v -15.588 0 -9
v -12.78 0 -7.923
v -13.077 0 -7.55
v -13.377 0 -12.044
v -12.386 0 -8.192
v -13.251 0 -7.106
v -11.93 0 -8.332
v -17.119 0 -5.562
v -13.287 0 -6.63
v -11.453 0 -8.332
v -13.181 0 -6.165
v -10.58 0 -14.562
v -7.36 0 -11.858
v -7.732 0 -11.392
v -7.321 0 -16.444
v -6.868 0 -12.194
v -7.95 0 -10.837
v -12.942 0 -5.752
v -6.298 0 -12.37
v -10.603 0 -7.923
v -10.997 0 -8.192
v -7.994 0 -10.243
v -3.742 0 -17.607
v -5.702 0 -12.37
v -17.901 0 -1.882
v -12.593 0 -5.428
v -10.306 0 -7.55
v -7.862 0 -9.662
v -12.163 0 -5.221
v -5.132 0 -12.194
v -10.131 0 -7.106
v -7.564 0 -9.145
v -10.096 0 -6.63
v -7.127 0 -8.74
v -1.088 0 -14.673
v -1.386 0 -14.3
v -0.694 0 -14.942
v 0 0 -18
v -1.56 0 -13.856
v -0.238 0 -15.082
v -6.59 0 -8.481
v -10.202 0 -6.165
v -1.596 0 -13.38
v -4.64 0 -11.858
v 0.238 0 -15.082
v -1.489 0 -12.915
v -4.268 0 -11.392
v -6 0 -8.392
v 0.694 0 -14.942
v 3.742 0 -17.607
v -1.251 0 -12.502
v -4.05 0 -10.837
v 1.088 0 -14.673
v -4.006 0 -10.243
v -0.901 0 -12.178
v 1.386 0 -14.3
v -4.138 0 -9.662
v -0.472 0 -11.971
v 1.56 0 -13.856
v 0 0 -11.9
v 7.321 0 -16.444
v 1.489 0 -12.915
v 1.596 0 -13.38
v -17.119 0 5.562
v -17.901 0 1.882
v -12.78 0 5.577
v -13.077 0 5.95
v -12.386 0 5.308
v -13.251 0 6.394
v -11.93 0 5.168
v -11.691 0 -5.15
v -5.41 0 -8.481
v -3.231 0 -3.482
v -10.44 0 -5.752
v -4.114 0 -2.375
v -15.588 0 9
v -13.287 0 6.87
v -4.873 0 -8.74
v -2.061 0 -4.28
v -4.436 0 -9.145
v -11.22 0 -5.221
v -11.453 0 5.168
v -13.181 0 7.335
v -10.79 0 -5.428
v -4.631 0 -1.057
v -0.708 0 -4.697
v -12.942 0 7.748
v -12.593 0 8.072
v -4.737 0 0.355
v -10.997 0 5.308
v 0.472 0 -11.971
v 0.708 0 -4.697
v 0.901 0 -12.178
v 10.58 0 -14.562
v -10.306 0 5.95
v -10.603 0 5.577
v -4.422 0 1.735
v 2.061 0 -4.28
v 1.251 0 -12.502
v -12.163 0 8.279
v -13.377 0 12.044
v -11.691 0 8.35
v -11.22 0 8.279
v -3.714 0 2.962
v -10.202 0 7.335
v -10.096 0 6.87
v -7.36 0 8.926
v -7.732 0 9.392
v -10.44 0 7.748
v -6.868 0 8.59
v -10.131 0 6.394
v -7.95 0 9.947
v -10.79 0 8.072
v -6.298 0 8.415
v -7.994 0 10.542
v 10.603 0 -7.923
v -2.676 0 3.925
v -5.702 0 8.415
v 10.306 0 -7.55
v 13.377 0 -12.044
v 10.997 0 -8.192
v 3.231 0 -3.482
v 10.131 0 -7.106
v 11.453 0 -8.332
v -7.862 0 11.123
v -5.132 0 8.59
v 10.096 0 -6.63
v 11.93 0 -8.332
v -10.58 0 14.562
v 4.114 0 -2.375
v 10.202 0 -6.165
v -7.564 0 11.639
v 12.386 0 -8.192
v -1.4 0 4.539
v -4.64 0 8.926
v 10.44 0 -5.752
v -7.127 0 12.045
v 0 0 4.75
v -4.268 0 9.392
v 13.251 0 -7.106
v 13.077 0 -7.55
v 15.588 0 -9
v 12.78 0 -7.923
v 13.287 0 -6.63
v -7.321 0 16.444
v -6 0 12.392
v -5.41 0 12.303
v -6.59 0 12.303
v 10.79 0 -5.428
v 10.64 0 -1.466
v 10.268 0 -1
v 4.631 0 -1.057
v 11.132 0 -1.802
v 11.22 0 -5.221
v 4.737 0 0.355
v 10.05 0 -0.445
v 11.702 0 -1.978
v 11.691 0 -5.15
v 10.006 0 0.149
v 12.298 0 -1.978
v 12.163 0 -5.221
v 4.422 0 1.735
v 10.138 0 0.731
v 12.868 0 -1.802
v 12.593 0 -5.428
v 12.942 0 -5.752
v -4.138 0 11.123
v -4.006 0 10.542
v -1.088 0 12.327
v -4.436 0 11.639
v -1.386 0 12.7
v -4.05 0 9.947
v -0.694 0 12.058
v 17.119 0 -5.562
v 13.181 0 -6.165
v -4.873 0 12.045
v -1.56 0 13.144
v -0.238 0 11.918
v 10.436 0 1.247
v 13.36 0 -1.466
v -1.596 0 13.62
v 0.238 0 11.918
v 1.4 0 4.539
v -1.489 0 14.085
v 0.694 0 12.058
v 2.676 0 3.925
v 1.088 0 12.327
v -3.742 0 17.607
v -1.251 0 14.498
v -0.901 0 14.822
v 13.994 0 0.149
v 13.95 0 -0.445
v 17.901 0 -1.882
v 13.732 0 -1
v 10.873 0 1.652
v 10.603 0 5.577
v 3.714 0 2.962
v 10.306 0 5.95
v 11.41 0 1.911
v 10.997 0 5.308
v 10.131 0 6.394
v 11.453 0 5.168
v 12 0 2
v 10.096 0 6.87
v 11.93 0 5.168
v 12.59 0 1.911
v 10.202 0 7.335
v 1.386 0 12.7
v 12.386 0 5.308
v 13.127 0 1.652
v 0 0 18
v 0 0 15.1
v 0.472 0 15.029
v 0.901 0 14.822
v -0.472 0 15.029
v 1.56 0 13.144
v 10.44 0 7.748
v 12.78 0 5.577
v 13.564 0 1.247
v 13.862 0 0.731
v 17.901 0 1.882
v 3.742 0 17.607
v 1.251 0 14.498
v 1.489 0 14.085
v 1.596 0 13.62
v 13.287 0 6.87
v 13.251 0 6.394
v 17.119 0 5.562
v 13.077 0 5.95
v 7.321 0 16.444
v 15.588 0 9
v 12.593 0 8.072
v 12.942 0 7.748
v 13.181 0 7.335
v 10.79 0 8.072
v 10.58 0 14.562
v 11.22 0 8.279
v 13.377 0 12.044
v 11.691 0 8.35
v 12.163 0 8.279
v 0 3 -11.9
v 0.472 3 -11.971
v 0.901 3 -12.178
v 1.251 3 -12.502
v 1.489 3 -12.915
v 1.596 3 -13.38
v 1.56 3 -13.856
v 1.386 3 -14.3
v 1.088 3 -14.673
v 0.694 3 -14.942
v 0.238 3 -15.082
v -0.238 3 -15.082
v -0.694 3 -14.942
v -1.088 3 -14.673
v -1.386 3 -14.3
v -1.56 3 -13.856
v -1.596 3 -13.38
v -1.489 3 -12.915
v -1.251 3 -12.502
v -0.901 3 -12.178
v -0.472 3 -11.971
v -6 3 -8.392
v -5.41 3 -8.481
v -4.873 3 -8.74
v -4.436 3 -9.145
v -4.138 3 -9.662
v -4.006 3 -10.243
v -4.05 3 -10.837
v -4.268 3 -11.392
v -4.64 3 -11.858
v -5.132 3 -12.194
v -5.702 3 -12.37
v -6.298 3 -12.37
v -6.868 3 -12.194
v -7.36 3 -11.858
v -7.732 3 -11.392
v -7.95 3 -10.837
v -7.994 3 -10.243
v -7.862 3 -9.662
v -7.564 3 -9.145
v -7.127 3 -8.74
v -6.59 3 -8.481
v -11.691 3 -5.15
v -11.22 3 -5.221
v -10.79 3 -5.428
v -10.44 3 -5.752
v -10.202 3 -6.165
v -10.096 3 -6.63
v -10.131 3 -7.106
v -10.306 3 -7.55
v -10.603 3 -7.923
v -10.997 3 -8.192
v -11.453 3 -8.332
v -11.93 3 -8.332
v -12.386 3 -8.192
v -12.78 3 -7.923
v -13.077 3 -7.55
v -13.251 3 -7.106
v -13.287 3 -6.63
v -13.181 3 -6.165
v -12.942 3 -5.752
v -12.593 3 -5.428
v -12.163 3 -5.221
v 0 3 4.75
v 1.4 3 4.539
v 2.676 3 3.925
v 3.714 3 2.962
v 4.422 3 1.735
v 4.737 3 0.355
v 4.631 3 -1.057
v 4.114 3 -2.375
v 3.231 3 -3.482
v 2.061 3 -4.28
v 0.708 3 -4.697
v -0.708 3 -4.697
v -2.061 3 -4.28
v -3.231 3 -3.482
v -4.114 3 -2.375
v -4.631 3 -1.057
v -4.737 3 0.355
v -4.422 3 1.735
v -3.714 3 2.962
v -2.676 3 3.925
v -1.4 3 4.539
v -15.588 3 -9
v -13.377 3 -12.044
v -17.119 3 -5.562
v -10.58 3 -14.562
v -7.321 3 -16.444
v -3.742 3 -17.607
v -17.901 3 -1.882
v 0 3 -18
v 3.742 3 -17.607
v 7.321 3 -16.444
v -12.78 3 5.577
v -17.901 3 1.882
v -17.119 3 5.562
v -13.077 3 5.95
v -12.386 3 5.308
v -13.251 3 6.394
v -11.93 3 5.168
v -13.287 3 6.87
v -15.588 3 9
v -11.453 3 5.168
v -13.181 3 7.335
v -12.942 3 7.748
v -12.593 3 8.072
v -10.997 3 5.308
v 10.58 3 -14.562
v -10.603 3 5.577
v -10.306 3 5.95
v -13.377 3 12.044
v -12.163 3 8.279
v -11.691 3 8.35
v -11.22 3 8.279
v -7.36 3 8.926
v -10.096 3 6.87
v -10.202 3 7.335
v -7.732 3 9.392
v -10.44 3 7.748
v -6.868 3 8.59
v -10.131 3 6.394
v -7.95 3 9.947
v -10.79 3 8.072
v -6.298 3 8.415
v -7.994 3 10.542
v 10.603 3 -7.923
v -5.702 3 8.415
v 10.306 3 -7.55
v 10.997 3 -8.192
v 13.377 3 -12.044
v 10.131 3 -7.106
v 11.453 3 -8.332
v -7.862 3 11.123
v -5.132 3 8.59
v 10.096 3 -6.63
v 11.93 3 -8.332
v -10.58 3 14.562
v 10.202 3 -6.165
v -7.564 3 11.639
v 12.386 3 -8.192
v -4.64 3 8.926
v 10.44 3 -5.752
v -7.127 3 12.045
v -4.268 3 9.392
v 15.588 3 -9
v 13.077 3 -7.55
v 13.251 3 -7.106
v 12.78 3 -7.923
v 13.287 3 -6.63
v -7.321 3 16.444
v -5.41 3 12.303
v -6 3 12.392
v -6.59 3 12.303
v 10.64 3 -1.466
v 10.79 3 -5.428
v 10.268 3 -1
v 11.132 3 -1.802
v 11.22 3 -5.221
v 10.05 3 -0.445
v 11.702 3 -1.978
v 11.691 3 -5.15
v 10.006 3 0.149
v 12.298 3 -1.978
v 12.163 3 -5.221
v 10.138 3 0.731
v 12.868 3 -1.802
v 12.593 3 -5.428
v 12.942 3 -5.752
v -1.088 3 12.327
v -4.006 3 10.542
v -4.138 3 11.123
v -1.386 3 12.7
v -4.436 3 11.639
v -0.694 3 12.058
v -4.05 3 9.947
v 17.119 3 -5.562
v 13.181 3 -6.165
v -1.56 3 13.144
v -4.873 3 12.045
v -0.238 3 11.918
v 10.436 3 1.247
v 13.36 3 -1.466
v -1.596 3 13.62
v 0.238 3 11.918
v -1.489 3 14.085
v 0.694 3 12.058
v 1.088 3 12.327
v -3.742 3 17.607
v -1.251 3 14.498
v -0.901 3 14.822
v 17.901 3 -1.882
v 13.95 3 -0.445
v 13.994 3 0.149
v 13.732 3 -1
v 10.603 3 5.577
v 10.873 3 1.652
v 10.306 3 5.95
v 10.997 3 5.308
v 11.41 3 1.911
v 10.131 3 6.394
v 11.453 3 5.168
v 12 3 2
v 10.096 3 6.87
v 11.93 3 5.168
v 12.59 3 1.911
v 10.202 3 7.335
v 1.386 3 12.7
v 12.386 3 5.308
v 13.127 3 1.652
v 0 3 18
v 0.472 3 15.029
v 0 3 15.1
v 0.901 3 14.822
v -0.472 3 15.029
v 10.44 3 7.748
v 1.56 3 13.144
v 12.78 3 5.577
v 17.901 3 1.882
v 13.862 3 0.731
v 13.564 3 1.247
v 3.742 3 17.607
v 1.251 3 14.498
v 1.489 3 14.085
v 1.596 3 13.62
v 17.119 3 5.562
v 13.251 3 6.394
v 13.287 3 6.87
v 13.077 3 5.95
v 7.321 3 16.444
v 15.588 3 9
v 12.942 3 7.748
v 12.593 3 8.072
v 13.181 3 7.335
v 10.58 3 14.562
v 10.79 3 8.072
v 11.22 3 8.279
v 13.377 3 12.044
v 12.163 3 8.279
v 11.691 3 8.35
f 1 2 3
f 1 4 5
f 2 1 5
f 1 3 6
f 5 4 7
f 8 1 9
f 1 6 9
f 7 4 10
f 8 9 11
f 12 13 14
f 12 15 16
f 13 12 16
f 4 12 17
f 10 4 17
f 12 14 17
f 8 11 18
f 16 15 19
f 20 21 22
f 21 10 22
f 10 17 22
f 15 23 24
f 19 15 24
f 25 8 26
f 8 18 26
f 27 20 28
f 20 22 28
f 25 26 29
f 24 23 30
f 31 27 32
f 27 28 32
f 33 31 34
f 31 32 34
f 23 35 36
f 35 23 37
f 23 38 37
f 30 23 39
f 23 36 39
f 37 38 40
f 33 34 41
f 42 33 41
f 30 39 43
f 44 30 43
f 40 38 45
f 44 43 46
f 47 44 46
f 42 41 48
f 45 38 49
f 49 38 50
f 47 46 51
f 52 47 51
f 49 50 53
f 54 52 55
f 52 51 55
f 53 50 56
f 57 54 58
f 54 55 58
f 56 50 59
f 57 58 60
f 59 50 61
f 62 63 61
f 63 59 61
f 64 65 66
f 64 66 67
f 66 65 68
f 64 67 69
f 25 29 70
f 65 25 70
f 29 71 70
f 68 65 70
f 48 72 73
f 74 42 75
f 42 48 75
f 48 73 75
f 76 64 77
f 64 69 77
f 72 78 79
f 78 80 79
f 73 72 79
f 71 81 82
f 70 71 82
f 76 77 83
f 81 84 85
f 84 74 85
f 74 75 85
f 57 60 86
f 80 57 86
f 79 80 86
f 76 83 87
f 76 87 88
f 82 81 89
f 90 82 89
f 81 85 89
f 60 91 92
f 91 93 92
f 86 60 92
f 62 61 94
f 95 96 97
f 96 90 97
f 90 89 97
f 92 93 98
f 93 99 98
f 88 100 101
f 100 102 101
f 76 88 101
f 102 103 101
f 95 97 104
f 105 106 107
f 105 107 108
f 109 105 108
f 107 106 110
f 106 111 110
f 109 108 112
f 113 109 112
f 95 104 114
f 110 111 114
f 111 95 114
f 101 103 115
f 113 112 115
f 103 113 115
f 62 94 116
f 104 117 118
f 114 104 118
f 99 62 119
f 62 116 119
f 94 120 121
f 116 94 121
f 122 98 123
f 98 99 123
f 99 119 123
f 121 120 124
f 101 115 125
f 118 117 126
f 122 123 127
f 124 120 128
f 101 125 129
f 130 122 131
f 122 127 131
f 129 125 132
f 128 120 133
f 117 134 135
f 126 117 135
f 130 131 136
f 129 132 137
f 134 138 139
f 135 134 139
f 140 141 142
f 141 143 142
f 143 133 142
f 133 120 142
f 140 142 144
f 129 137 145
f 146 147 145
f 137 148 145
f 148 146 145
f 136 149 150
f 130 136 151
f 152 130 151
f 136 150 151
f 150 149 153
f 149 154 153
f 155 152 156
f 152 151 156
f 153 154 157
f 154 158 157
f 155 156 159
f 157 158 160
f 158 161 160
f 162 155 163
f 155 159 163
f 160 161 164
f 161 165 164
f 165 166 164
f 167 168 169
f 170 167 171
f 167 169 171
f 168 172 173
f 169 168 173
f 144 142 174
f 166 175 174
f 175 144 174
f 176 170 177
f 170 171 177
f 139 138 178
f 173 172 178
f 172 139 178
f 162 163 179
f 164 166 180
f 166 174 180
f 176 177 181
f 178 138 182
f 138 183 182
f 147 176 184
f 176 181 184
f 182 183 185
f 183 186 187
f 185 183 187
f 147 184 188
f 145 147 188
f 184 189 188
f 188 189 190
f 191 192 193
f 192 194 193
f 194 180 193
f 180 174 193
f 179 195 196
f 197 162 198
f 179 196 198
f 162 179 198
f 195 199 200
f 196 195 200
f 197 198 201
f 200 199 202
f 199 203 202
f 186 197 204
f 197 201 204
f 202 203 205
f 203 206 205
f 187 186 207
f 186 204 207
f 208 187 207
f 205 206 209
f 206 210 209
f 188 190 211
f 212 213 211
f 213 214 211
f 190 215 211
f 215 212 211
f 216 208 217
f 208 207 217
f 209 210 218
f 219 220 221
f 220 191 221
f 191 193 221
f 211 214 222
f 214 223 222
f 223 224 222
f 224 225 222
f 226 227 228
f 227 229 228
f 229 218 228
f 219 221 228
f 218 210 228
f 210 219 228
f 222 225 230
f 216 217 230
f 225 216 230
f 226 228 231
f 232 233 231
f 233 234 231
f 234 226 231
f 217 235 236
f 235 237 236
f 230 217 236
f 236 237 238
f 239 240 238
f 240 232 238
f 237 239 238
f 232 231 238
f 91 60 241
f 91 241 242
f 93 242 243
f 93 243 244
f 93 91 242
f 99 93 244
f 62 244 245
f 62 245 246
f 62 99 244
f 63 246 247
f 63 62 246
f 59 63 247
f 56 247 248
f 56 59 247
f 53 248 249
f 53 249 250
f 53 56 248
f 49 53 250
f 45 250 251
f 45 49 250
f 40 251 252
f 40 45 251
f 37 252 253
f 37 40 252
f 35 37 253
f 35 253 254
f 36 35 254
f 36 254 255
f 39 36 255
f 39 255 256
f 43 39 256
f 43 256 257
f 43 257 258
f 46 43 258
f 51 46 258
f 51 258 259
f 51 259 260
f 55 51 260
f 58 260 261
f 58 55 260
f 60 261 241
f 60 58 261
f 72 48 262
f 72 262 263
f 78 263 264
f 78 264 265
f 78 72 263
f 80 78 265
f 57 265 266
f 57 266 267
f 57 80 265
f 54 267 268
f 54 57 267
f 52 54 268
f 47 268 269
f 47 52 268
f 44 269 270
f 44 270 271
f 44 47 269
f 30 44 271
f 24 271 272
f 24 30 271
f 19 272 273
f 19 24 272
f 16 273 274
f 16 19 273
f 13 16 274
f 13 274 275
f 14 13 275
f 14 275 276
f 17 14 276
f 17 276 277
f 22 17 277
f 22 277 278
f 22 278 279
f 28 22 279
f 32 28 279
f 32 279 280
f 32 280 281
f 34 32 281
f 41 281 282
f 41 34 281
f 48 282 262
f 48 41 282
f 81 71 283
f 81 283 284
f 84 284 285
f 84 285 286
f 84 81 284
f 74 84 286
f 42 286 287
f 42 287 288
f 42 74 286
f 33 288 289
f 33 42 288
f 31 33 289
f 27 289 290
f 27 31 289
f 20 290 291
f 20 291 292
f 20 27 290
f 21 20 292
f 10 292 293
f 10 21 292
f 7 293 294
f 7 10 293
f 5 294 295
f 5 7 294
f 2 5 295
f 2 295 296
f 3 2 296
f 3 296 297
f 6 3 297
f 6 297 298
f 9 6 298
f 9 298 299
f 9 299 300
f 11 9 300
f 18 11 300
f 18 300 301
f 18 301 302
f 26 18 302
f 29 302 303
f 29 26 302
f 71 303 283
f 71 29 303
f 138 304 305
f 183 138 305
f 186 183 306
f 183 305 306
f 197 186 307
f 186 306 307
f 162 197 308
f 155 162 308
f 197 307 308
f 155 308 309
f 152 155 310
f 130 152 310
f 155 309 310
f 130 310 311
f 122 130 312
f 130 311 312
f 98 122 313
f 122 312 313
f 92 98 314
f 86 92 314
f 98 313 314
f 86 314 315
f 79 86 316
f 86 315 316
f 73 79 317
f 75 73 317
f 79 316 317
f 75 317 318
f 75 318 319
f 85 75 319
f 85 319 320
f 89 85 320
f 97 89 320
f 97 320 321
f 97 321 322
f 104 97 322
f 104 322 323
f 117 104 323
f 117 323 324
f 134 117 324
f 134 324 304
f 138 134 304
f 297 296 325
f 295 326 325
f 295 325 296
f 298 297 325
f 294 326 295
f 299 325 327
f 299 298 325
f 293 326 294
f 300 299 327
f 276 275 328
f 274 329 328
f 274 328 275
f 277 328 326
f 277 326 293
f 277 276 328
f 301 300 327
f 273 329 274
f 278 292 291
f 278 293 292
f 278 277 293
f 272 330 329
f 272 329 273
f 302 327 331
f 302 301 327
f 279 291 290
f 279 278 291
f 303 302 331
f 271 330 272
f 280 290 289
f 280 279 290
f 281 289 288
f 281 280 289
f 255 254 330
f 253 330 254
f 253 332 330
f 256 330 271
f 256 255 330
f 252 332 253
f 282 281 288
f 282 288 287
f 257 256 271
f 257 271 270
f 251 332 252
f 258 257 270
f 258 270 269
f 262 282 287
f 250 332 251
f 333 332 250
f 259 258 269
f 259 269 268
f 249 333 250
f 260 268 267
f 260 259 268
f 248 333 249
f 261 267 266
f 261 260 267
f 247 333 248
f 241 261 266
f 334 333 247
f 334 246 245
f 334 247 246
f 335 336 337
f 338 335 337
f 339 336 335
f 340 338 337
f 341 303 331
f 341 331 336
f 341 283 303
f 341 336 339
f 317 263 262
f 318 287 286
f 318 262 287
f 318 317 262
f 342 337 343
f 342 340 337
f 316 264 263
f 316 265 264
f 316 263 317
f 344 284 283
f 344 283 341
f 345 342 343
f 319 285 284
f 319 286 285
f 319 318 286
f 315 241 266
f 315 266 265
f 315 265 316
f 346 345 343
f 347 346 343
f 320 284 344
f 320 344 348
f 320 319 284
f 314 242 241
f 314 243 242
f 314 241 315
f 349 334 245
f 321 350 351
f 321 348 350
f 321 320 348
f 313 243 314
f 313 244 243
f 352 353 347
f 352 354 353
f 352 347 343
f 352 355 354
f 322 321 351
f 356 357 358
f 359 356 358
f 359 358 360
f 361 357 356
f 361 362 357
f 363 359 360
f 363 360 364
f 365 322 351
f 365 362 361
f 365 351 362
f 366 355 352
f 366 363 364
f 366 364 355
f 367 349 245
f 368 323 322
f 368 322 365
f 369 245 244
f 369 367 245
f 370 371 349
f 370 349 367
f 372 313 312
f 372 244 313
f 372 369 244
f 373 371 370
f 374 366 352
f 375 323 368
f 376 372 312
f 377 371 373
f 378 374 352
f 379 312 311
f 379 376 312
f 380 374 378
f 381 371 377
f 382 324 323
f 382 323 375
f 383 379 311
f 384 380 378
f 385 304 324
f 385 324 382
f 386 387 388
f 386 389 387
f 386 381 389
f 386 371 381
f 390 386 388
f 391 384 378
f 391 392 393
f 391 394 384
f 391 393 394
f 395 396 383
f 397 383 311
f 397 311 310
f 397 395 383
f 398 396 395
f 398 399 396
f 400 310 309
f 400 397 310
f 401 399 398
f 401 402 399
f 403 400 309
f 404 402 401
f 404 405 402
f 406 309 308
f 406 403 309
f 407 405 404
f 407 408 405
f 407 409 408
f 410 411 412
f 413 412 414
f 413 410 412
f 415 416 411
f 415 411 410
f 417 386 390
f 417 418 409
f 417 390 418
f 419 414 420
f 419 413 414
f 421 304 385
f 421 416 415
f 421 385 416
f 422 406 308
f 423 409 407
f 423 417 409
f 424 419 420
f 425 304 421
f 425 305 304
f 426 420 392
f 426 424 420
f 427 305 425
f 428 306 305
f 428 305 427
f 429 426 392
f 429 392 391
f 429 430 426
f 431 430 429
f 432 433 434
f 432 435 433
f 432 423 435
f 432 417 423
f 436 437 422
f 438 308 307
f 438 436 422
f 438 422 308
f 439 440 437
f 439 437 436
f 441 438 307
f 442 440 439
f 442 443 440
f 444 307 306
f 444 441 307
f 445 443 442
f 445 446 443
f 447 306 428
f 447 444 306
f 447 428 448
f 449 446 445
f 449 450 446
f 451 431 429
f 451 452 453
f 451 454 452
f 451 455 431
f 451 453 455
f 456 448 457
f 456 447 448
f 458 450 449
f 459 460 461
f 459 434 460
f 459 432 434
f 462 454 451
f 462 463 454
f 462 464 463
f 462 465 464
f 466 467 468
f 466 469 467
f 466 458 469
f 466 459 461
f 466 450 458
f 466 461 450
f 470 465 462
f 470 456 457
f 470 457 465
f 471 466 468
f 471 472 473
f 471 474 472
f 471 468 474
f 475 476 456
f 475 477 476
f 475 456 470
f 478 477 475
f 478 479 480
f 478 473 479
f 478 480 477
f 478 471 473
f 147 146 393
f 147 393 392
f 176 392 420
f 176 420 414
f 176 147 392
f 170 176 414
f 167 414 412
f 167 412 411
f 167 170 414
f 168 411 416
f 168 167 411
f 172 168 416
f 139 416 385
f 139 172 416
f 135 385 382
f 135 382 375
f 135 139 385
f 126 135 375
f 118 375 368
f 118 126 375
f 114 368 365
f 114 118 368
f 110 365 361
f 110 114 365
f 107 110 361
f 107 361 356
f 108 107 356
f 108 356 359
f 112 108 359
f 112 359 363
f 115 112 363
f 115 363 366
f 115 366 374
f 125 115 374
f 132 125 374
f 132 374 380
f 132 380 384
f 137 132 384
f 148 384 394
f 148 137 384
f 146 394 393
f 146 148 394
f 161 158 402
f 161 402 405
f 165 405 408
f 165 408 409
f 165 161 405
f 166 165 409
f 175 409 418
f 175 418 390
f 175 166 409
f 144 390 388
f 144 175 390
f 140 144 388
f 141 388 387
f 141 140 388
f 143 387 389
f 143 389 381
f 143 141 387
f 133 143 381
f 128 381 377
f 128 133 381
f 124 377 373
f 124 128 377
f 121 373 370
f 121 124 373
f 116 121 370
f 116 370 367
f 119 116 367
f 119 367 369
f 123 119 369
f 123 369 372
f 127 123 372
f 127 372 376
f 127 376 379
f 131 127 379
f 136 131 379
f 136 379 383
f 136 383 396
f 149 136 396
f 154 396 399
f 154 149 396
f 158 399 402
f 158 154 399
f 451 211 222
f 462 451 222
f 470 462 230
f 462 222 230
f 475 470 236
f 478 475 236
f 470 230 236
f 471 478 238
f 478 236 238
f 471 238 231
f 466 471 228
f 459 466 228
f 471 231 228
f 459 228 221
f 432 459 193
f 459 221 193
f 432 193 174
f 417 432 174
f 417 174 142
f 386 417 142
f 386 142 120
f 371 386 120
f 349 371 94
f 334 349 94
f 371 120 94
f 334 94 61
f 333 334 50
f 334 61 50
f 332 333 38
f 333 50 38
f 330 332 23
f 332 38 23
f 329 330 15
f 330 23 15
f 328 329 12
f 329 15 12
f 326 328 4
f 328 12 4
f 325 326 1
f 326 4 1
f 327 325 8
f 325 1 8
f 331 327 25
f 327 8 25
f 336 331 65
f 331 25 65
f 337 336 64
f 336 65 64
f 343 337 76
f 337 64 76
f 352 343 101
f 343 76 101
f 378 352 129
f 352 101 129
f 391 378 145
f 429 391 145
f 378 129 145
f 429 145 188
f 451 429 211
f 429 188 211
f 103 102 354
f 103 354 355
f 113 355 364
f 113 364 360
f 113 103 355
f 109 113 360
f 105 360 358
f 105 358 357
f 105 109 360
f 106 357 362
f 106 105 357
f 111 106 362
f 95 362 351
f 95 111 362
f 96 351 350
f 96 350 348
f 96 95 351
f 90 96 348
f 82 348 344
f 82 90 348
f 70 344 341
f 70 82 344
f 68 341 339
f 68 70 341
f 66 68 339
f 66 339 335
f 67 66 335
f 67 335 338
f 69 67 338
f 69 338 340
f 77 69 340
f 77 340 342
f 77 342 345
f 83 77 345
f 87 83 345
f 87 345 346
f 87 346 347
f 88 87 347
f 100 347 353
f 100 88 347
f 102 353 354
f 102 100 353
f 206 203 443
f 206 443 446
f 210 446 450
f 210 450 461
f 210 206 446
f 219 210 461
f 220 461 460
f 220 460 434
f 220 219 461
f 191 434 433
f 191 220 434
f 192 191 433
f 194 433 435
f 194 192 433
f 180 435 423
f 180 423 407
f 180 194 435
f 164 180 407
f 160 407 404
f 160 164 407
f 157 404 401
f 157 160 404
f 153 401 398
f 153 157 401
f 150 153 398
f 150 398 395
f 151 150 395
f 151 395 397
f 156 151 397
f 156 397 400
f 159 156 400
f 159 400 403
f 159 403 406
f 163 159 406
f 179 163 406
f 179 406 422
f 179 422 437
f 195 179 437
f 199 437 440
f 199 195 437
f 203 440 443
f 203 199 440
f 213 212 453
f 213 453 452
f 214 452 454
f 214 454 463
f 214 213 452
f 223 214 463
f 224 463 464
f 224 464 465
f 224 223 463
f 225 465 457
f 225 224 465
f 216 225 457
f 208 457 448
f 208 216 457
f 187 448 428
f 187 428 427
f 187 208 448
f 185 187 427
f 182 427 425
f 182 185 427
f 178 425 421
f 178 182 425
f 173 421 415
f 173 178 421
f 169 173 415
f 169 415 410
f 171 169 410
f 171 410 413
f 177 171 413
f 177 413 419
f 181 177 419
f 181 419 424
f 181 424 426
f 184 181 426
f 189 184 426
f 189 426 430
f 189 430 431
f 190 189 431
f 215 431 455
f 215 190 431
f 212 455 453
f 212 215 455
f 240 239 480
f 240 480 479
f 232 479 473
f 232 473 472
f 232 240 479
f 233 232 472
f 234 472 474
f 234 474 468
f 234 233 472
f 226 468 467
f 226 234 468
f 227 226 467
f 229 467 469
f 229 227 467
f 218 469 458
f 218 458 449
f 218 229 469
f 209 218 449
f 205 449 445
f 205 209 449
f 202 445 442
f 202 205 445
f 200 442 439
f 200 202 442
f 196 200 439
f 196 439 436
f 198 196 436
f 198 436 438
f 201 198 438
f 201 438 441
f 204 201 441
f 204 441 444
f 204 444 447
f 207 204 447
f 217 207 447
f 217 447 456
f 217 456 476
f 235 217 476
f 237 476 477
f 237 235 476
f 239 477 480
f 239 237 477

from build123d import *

# Parameters (mm, degrees)
SKETCH_1_R          = 18
SKETCH_1_R_2        = 1.6
SKETCH_1_R_3        = 2
EXTRUDE_1_DEPTH     = 3
SKETCH_3_R          = 4.75
CUT_EXTRUDE_1_DEPTH = 4


with BuildPart() as part:
    # 草图1 → 凸台-拉伸1 (new body)
    with BuildSketch(Plane(origin=(0, 0, 0), x_dir=(1, 0, 0), z_dir=(0, 1, 0))):
        with Locations(Location((0, 0, 0), (0, 0, 270))):
            Circle(SKETCH_1_R)
        with Locations(Location((0, 13.5, 0), (0, 0, 270))):
            Circle(SKETCH_1_R_2, mode=Mode.SUBTRACT)
        with Locations(Location((11.691342951, 6.75, 0), (0, 0, 270))):
            Circle(SKETCH_1_R_2, mode=Mode.SUBTRACT)
        with Locations(Location((11.691342951, -6.75, 0), (0, 0, 270))):
            Circle(SKETCH_1_R_2, mode=Mode.SUBTRACT)
        with Locations(Location((0, -13.5, 0), (0, 0, 270))):
            Circle(SKETCH_1_R_2, mode=Mode.SUBTRACT)
        with Locations(Location((-11.691342951, -6.75, 0), (0, 0, 270))):
            Circle(SKETCH_1_R_2, mode=Mode.SUBTRACT)
        with Locations(Location((-11.691342951, 6.75, 0), (0, 0, 270))):
            Circle(SKETCH_1_R_2, mode=Mode.SUBTRACT)
        with Locations(Location((12, 0, 0), (0, 0, 270))):
            Circle(SKETCH_1_R_3, mode=Mode.SUBTRACT)
        with Locations(Location((-6, -10.392304845, 0), (0, 0, 270))):
            Circle(SKETCH_1_R_3, mode=Mode.SUBTRACT)
        with Locations(Location((-6, 10.392304845, 0), (0, 0, 270))):
            Circle(SKETCH_1_R_3, mode=Mode.SUBTRACT)
    extrude(amount=EXTRUDE_1_DEPTH)

    # 草图3 → 切除-拉伸1 (cut)
    with BuildSketch(Plane(origin=(0, 3, 0), x_dir=(1, 0, 0), z_dir=(0, 1, 0))):
        with Locations(Location((0, 0, 0), (0, 0, 270))):
            Circle(SKETCH_3_R)
    extrude(amount=-CUT_EXTRUDE_1_DEPTH, mode=Mode.SUBTRACT)


solid = part.part
